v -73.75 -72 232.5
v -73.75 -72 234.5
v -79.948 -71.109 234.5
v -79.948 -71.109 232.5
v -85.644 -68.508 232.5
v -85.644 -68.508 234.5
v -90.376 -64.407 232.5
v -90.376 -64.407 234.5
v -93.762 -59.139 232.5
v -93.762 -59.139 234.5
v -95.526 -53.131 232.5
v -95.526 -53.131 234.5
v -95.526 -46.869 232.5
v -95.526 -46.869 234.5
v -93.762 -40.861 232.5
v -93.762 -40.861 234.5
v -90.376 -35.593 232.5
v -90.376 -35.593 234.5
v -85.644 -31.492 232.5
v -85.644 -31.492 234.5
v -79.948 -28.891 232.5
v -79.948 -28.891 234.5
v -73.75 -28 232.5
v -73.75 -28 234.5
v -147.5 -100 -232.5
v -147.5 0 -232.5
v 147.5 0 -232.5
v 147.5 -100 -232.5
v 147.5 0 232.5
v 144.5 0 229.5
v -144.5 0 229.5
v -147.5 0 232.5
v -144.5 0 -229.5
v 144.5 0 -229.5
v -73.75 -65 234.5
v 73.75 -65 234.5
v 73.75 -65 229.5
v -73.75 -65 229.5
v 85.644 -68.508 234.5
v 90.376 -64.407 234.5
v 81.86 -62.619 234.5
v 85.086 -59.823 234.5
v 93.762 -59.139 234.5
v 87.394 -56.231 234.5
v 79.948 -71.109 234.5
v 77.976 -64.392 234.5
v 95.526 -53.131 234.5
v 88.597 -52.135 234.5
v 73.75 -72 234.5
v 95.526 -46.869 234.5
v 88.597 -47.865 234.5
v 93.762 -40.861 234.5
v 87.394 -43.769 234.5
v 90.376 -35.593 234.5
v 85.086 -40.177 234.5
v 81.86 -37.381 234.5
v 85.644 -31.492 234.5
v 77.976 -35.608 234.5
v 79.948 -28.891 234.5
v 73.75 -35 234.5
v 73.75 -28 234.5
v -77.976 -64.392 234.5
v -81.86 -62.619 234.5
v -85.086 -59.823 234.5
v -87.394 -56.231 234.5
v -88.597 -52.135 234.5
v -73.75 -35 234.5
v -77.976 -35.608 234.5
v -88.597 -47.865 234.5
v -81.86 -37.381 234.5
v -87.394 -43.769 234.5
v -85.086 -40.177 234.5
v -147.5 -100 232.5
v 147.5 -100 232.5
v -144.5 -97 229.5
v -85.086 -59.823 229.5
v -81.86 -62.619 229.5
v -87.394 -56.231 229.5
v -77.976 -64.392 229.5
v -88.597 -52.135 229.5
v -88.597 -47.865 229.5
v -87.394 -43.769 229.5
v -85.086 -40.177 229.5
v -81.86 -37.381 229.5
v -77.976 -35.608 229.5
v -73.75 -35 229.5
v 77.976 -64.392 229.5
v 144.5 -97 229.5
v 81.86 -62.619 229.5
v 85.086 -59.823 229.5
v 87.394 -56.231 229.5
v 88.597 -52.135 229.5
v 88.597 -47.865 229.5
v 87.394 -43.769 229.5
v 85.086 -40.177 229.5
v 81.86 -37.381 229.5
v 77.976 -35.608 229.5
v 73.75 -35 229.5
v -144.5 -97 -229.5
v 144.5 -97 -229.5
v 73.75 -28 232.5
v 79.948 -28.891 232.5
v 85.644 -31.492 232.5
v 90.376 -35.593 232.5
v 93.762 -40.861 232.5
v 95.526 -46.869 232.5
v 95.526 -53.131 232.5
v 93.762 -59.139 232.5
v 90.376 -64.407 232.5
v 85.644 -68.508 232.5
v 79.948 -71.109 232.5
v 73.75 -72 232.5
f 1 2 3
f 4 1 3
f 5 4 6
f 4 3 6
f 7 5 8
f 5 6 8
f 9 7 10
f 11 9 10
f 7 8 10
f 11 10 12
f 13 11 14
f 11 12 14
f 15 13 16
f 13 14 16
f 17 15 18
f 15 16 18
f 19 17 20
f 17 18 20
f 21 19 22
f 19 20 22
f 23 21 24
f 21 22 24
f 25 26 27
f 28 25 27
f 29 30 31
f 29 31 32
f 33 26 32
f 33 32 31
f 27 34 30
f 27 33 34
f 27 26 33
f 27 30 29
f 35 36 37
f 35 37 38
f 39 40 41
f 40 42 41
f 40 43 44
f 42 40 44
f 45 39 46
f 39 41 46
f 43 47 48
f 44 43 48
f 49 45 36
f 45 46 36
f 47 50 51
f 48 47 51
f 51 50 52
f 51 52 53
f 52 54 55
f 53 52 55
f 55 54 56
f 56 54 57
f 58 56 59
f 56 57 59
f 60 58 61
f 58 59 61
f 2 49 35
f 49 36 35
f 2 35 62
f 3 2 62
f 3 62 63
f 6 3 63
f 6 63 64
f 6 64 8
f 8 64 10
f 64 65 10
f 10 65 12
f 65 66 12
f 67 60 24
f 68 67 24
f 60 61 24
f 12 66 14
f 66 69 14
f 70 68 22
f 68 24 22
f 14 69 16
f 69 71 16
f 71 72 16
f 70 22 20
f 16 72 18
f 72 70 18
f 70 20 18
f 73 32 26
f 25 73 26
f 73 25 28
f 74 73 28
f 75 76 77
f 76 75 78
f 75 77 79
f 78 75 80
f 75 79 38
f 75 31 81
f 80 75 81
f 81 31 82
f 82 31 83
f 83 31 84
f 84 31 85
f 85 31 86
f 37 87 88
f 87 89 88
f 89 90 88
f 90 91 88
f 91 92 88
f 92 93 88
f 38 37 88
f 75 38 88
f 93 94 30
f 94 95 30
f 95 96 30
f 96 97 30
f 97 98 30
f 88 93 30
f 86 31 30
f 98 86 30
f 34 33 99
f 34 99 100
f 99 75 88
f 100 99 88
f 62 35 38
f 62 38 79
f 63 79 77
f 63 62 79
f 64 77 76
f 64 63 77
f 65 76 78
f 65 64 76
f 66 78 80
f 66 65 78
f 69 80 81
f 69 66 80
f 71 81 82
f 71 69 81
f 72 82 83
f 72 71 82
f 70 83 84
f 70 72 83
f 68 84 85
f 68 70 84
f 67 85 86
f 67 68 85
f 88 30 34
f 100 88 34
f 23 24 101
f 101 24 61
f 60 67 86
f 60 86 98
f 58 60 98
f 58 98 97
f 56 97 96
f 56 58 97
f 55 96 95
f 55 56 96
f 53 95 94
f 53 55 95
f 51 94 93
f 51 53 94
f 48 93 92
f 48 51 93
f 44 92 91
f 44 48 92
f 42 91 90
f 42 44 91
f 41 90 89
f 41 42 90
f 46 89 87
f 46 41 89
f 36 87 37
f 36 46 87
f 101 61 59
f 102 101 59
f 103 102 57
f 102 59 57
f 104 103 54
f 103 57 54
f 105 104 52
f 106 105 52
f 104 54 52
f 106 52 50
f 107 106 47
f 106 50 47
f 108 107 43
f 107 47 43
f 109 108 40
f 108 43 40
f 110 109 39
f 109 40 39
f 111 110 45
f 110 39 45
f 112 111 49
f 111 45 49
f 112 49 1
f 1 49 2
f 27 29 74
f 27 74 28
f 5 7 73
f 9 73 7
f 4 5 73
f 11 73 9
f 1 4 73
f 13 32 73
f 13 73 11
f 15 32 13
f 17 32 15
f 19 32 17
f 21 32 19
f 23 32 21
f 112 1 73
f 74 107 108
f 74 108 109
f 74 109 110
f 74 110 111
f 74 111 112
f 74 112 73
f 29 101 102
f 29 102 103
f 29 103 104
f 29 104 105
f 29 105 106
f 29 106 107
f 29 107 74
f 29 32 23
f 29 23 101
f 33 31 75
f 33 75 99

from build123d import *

# Parameters (mm, degrees)
SKETCH2_W           = 295
SKETCH2_H           = 465
BOSS_EXTRUDE1_DEPTH = 100
SHELL5_T            = -3
CUT_EXTRUDE5_DEPTH  = 462
BOSS_EXTRUDE2_START = 2
BOSS_EXTRUDE2_DEPTH = 2


with BuildPart() as part:
    # Sketch2 → Boss-Extrude1 (new body)
    with BuildSketch(Plane(origin=(0, 0, 0), x_dir=(1, 0, 0), z_dir=(0, 1, 0))):
        Rectangle(SKETCH2_W, SKETCH2_H)
    extrude(amount=-BOSS_EXTRUDE1_DEPTH)

    # Shell5
    shell5_openings = [part.faces().sort_by_distance(p)[0] for p in [
        (0, 0, 0),
    ]]
    offset(amount=SHELL5_T, openings=shell5_openings, kind=Kind.INTERSECTION)

    # Sketch3 → Cut-Extrude5 (cut)
    with BuildSketch(Plane.XY.offset(232.5)):
        with BuildLine():
            Line((-73.75, -35), (73.75, -35))
            ThreePointArc((73.75, -35), (88.75, -50), (73.75, -65))
            Line((73.75, -65), (-73.75, -65))
            ThreePointArc((-73.75, -65), (-88.75, -50), (-73.75, -35))
        make_face()
    extrude(amount=-CUT_EXTRUDE5_DEPTH, mode=Mode.SUBTRACT)

    # Sketch3<4> → Boss-Extrude2 (add)
    with BuildSketch(Plane.XY.offset(232.5).offset(BOSS_EXTRUDE2_START)):
        with BuildLine():
            Line((-73.75, -28), (73.75, -28))
            ThreePointArc((73.75, -28), (95.75, -50), (73.75, -72))
            Line((73.75, -72), (-73.75, -72))
            ThreePointArc((-73.75, -72), (-95.75, -50), (-73.75, -28))
        make_face()
        with BuildLine():
            Line((-73.75, -35), (73.75, -35))
            ThreePointArc((73.75, -35), (88.75, -50), (73.75, -65))
            Line((73.75, -65), (-73.75, -65))
            ThreePointArc((-73.75, -65), (-88.75, -50), (-73.75, -35))
        make_face(mode=Mode.SUBTRACT)
    extrude(amount=-BOSS_EXTRUDE2_DEPTH)


solid = part.part
